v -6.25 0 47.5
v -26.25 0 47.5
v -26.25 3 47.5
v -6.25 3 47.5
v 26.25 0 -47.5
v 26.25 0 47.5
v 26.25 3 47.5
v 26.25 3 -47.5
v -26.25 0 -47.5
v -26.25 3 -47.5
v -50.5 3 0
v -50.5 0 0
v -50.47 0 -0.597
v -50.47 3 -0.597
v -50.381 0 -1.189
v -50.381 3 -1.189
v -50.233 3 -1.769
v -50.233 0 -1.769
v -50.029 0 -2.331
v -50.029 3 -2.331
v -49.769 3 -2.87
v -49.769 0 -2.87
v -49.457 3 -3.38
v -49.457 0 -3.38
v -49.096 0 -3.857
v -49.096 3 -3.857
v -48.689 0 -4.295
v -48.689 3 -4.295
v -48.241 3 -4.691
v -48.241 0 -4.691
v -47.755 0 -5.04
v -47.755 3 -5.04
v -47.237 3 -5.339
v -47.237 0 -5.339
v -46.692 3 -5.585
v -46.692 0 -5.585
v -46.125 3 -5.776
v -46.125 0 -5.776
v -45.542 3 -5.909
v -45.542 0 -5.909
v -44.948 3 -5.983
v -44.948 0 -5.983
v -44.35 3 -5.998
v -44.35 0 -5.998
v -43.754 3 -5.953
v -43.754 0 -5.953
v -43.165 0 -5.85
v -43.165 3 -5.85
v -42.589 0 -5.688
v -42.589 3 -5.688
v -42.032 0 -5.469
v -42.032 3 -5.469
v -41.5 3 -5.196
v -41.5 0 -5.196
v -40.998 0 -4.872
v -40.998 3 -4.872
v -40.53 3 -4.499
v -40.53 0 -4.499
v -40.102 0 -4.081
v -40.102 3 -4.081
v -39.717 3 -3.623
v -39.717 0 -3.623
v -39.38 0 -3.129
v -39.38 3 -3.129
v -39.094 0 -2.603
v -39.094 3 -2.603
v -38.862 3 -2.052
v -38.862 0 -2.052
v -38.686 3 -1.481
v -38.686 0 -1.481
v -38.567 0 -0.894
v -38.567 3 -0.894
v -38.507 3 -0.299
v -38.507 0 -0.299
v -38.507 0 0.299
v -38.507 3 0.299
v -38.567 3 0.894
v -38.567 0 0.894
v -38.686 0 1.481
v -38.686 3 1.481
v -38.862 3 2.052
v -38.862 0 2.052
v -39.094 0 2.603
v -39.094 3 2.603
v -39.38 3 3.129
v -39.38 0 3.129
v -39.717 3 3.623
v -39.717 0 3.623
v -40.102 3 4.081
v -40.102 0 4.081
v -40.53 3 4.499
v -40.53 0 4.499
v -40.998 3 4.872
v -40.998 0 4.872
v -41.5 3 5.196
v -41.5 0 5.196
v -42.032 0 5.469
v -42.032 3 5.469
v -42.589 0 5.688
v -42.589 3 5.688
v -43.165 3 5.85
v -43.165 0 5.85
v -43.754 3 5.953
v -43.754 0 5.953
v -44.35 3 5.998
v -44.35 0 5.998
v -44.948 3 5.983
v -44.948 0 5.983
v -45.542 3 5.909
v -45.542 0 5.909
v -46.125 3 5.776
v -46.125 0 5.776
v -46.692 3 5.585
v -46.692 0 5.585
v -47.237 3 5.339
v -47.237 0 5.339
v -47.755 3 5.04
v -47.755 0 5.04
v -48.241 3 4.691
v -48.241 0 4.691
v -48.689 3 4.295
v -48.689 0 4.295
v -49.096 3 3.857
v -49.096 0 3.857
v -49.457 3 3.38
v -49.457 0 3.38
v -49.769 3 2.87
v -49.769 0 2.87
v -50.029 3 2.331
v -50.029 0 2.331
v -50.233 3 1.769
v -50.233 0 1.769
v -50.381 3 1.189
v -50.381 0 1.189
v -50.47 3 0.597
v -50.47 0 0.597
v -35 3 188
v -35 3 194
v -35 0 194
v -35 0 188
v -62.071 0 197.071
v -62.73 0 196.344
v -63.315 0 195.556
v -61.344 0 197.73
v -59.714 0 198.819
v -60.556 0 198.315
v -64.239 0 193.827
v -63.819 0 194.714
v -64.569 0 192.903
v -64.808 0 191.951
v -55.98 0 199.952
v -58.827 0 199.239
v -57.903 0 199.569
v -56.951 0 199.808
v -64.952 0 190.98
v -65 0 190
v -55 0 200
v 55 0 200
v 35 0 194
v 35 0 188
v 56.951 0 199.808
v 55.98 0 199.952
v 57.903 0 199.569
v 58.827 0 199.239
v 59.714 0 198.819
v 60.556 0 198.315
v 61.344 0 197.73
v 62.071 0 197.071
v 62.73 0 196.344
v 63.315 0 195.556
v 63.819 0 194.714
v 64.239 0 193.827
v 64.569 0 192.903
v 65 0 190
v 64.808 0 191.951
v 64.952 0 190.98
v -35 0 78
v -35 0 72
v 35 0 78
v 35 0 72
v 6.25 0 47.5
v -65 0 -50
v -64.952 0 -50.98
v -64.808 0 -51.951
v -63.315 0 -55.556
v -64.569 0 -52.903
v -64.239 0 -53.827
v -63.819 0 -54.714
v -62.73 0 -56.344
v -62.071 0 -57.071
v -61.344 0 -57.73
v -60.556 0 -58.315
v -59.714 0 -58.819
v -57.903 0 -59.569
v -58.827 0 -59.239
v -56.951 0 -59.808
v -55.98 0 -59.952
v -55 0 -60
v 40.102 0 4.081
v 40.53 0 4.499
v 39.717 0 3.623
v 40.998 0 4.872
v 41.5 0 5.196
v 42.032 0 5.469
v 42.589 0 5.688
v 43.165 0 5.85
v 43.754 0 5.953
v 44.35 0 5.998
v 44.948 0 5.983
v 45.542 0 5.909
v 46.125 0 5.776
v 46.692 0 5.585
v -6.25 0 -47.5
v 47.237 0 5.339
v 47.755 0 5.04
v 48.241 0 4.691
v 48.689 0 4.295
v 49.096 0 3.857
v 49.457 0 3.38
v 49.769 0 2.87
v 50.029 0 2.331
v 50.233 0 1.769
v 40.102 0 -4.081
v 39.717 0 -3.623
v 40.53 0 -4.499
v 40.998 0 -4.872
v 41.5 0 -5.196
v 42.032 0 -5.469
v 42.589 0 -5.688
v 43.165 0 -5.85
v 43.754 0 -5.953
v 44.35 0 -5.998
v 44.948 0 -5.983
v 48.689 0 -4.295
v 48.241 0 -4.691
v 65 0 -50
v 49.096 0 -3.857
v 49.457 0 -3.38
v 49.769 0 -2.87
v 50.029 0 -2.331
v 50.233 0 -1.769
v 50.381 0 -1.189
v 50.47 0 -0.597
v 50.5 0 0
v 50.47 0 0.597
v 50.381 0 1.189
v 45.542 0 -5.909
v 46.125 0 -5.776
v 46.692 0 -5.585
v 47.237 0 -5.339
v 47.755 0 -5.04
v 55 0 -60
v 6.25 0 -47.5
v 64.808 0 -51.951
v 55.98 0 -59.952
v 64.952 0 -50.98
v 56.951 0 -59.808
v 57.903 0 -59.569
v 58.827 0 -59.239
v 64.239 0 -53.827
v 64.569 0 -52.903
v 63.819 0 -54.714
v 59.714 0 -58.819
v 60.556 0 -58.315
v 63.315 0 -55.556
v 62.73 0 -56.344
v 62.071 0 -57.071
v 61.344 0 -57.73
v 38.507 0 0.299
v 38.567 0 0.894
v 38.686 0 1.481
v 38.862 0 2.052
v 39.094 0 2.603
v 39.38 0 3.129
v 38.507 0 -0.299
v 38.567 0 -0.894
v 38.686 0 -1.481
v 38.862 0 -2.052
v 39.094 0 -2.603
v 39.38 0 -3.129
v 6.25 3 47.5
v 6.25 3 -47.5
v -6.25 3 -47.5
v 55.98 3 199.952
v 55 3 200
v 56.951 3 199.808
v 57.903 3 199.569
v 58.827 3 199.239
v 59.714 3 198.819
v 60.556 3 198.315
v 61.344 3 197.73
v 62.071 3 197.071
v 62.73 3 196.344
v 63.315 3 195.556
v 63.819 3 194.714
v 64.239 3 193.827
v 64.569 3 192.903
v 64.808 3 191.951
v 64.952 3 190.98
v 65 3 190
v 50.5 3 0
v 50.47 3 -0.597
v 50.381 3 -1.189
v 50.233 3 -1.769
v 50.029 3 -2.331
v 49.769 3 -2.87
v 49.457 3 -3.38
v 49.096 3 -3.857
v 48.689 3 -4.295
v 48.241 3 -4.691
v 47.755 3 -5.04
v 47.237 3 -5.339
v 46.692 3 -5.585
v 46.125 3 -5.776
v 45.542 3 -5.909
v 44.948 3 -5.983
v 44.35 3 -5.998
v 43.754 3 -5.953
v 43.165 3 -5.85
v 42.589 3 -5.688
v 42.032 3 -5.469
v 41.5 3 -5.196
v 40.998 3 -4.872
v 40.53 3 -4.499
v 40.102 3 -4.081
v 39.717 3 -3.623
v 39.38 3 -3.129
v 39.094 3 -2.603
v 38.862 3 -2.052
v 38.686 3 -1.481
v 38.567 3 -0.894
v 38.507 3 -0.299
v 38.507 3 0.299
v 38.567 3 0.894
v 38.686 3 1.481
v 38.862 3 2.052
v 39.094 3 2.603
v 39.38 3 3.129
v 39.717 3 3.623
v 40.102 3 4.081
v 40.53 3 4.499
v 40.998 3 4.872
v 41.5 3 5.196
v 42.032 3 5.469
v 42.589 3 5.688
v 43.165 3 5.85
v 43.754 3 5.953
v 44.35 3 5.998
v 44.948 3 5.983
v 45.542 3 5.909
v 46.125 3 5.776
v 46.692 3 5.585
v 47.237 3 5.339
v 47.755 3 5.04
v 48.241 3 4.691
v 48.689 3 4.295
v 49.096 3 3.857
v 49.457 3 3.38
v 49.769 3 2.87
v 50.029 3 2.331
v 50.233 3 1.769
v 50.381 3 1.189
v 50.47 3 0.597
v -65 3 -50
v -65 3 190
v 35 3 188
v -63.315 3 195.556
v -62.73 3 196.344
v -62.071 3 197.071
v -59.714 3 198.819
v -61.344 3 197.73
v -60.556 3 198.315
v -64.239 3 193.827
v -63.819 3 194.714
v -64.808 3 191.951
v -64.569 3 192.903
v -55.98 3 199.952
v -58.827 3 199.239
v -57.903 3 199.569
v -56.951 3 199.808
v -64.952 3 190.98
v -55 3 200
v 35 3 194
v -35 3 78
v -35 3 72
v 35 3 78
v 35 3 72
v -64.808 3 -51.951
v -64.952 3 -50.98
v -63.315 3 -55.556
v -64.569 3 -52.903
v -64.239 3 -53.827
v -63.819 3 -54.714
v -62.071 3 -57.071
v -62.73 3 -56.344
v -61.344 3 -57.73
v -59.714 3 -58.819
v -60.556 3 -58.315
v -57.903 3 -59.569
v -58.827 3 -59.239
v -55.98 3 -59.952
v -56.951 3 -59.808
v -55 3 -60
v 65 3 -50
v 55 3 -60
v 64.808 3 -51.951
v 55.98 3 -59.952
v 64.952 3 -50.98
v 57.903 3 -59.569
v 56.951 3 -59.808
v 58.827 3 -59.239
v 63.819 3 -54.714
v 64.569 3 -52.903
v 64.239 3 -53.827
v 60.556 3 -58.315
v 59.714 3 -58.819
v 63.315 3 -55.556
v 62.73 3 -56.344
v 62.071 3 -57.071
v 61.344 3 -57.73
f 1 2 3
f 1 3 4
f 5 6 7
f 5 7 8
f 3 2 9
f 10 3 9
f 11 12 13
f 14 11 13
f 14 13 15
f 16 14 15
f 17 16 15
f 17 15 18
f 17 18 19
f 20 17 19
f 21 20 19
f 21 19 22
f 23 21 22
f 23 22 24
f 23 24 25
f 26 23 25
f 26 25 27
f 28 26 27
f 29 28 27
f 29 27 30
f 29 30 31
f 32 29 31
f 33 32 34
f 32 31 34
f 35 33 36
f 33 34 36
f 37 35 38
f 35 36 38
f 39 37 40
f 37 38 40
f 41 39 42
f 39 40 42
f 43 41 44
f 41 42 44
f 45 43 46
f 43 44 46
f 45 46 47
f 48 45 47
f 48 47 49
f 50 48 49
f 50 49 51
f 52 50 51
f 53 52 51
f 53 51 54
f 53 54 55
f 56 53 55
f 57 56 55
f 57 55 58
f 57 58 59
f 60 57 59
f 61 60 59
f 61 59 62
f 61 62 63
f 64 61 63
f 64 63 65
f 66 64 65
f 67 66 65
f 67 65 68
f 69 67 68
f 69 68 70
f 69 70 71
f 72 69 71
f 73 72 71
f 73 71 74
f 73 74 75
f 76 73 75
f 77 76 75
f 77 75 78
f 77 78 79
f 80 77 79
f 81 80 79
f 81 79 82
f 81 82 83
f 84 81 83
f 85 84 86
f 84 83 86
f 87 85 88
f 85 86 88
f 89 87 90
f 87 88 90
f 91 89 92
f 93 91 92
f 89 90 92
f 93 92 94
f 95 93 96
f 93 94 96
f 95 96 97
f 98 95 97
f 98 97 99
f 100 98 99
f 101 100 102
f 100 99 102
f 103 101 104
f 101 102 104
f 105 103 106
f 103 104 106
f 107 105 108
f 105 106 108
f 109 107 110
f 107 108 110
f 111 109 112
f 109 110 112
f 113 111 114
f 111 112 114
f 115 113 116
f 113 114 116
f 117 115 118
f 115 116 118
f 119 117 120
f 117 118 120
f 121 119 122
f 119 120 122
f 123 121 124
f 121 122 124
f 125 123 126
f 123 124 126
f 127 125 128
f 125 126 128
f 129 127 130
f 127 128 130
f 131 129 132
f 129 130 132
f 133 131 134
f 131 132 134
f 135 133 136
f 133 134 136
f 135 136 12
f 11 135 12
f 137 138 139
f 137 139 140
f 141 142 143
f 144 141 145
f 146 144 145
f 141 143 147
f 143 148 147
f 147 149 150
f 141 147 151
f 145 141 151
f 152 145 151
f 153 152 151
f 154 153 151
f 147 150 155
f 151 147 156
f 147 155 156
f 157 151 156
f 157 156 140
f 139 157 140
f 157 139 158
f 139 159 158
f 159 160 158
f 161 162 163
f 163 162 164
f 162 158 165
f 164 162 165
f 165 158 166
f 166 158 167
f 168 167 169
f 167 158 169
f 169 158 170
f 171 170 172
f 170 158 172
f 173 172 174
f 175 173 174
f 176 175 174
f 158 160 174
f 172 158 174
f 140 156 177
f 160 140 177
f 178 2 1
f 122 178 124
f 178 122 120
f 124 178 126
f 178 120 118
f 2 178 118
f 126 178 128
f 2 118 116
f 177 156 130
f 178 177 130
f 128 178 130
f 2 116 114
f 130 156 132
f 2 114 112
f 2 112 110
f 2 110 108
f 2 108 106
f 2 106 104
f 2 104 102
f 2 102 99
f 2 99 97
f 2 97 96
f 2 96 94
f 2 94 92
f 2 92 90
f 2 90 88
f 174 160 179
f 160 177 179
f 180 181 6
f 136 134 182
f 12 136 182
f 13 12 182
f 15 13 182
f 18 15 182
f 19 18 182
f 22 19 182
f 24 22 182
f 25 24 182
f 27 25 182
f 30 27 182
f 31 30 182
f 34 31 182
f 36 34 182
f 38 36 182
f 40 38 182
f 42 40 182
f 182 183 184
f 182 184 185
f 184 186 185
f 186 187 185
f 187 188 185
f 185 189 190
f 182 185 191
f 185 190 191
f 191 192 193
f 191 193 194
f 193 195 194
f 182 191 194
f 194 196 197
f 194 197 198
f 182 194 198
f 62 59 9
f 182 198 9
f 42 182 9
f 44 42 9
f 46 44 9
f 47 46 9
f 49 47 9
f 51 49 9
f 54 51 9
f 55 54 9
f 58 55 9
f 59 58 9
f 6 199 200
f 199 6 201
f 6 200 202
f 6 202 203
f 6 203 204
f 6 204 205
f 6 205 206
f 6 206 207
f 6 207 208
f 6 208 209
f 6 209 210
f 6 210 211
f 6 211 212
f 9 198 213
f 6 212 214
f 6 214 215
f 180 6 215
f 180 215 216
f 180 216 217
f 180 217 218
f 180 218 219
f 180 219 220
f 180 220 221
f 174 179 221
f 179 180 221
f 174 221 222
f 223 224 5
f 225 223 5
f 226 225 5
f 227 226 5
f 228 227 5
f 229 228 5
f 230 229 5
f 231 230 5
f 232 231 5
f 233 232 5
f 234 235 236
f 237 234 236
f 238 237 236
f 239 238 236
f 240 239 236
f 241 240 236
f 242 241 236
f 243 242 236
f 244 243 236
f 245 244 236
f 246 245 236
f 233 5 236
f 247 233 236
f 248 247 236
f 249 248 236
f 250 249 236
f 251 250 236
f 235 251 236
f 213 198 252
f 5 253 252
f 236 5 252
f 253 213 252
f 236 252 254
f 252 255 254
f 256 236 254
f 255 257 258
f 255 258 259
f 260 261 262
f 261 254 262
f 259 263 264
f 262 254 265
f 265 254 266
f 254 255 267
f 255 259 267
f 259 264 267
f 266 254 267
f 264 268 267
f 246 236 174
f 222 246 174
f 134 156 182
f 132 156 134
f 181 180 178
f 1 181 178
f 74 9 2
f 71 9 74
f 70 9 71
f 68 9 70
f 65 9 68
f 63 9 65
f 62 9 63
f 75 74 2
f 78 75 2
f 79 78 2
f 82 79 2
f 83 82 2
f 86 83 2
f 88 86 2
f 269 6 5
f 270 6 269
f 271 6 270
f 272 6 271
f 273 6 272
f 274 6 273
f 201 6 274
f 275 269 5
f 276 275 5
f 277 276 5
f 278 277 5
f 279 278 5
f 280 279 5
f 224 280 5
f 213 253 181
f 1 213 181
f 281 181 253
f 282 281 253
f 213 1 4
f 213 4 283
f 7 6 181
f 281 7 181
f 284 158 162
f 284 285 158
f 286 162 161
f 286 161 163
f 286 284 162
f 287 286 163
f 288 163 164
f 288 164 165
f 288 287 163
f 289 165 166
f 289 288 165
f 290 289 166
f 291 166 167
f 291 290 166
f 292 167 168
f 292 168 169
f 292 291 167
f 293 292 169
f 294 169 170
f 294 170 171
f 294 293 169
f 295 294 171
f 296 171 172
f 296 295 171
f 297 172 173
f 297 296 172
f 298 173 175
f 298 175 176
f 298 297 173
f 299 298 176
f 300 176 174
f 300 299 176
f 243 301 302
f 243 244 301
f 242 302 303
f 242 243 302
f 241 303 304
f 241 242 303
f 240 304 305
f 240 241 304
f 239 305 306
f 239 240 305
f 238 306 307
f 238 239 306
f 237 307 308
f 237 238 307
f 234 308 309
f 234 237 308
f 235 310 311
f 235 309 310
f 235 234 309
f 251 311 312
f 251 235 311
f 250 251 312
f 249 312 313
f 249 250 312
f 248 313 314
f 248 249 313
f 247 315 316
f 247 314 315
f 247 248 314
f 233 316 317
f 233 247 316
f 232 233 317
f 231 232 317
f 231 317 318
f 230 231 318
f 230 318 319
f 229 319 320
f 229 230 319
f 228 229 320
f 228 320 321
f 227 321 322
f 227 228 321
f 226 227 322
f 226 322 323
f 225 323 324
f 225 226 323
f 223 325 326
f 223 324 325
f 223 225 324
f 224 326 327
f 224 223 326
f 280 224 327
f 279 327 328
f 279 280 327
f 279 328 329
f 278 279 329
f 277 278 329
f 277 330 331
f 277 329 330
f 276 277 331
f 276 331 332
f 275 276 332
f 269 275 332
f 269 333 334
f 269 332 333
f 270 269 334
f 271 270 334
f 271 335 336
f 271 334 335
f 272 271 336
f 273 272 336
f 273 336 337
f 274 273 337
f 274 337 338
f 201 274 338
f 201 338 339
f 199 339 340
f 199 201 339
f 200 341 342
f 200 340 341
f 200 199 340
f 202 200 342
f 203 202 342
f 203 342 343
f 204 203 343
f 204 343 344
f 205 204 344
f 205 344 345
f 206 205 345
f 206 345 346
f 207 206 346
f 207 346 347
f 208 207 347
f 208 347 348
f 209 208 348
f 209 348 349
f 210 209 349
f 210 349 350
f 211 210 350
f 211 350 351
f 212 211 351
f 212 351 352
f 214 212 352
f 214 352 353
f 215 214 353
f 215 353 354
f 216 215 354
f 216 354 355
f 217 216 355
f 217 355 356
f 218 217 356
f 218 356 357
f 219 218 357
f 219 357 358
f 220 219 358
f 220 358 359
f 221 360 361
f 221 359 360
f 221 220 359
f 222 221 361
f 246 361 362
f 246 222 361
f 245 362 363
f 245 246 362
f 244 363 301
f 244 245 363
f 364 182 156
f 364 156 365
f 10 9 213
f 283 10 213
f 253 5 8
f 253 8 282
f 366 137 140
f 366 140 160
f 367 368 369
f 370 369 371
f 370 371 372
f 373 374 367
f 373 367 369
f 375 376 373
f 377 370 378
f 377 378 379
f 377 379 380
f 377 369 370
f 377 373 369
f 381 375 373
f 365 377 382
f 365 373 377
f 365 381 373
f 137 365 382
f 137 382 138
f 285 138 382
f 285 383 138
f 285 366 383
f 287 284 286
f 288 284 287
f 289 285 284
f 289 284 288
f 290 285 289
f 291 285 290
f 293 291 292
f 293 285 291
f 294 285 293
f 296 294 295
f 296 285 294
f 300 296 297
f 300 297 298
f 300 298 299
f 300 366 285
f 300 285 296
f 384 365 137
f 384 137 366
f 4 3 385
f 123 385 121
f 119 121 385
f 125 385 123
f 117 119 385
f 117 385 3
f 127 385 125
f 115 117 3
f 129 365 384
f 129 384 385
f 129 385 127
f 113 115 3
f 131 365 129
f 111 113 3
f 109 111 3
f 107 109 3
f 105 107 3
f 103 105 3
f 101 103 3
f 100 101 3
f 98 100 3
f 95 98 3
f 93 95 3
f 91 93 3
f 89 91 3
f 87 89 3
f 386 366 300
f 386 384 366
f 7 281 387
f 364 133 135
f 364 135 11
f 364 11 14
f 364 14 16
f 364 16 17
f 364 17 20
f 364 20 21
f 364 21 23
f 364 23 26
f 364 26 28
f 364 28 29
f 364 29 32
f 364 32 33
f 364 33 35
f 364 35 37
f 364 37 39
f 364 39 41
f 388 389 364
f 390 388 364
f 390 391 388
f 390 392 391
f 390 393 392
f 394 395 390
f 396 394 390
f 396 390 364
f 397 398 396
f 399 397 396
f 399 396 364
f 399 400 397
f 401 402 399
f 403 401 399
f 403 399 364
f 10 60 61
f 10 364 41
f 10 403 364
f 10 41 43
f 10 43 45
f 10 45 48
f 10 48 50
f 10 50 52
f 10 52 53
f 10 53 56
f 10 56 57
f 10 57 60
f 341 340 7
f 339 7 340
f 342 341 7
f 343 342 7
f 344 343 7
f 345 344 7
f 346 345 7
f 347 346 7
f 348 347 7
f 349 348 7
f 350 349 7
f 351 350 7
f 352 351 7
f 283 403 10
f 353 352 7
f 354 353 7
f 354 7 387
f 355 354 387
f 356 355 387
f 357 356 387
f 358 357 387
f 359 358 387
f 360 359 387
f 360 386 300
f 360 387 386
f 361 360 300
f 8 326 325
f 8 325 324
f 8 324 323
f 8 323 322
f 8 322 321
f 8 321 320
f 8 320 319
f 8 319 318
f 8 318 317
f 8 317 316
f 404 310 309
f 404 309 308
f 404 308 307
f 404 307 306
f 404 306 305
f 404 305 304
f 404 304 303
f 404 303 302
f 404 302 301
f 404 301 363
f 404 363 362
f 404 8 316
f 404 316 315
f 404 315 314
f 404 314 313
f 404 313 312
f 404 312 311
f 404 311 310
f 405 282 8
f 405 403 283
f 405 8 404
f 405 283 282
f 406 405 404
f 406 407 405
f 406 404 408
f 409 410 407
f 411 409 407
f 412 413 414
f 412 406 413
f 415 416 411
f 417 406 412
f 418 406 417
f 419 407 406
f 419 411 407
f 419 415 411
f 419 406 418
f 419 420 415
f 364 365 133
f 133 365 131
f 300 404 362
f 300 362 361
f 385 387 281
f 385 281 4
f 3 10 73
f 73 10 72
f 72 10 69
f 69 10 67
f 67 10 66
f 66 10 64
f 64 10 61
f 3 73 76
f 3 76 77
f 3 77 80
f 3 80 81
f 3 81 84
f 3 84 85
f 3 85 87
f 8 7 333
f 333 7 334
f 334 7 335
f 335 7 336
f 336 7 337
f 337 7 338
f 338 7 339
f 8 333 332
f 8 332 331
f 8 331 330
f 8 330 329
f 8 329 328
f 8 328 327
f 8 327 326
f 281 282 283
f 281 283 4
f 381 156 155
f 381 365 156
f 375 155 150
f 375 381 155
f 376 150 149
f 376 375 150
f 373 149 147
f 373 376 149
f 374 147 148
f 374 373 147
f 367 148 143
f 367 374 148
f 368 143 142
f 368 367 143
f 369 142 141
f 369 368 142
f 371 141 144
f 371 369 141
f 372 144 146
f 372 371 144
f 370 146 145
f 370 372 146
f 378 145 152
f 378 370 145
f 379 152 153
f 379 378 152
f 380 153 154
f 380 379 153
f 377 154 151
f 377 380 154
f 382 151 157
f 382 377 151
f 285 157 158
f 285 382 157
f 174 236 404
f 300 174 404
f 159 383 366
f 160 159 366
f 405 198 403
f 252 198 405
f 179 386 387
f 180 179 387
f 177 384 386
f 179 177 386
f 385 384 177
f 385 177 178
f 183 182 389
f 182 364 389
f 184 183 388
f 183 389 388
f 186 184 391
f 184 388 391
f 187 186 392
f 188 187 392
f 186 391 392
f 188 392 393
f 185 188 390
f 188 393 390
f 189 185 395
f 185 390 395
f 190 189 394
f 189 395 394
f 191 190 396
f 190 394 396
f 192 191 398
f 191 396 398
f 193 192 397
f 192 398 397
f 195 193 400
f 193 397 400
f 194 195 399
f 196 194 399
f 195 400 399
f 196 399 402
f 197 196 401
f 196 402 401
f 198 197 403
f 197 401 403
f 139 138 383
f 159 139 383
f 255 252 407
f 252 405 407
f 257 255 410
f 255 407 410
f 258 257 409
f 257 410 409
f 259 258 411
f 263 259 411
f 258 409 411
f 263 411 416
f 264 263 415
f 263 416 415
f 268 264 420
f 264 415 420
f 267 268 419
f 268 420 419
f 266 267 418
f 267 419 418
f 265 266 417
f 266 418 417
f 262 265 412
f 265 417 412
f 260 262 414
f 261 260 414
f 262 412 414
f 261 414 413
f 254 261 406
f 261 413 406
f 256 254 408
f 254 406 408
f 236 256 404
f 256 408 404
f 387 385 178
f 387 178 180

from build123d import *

# Parameters (mm, degrees)
SKETCH1_W               = 130
SKETCH1_H               = 120
BOSS_EXTRUDE1_DEPTH     = 3
CUT_EXTRUDE1_START      = -4
SKETCH2_W               = 20
SKETCH2_H               = 95
CUT_EXTRUDE1_DEPTH      = 5
CUT_EXTRUDE2_START      = -4
SKETCH3_R               = 6
CUT_EXTRUDE2_DEPTH      = 5
SKETCH4_W               = 130
SKETCH4_H               = 3
BOSS_EXTRUDE2_DEPTH     = 140
SKETCH5_W               = 70
SKETCH5_H               = 6
CUT_EXTRUDE3_DEPTH      = 1
CUT_EXTRUDE3_DEPTH_BACK = 4
FILLET1_R               = 10


with BuildPart() as part:
    # Sketch1 → Boss-Extrude1 (new body)
    with BuildSketch(Plane(origin=(0, 0, 0), x_dir=(1, 0, 0), z_dir=(0, 1, 0))):
        Rectangle(SKETCH1_W, SKETCH1_H)
    extrude(amount=BOSS_EXTRUDE1_DEPTH)

    # Sketch2 → Cut-Extrude1 (cut)
    with BuildSketch(Plane(origin=(0, 3, 0), x_dir=(1, 0, 0), z_dir=(0, 1, 0)).offset(CUT_EXTRUDE1_START)):
        with Locations((-16.25, 0)):
            Rectangle(SKETCH2_W, SKETCH2_H)
    cut_extrude1 = extrude(amount=CUT_EXTRUDE1_DEPTH, mode=Mode.SUBTRACT)

    # Mirror1: Cut-Extrude1 across plane
    add(cut_extrude1.mirror(Plane(origin=(0, 0, 0), x_dir=(0, 0, 1), z_dir=(1, 0, 0))), mode=Mode.SUBTRACT)

    # Sketch3 → Cut-Extrude2 (cut)
    with BuildSketch(Plane(origin=(0, 3, 0), x_dir=(1, 0, 0), z_dir=(0, 1, 0)).offset(CUT_EXTRUDE2_START)):
        with Locations((44.5, 0)):
            Circle(SKETCH3_R)
    cut_extrude2 = extrude(amount=CUT_EXTRUDE2_DEPTH, mode=Mode.SUBTRACT)

    # Mirror2: Cut-Extrude2 across plane
    add(cut_extrude2.mirror(Plane(origin=(0, 0, 0), x_dir=(0, 0, 1), z_dir=(1, 0, 0))), mode=Mode.SUBTRACT)

    # Sketch4 → Boss-Extrude2 (add)
    with BuildSketch(Plane.XY.offset(60)):
        with Locations((0, 1.5)):
            Rectangle(SKETCH4_W, SKETCH4_H)
    extrude(amount=BOSS_EXTRUDE2_DEPTH)

    # Sketch5 → Cut-Extrude3 (cut, two sides)
    with BuildSketch(Plane(origin=(0, 3, 0), x_dir=(1, 0, 0), z_dir=(0, 1, 0))) as cut_extrude3_sk:
        with Locations((0, -75)):
            Rectangle(SKETCH5_W, SKETCH5_H)
        with Locations((0, -191)):
            Rectangle(SKETCH5_W, SKETCH5_H)
    extrude(amount=CUT_EXTRUDE3_DEPTH, mode=Mode.SUBTRACT)
    extrude(cut_extrude3_sk.sketch, amount=-CUT_EXTRUDE3_DEPTH_BACK, mode=Mode.SUBTRACT)

    # Fillet1
    fillet1_edges = [part.edges().sort_by_distance(p)[0] for p in [
        (-65, 1.5, 200),
        (65, 1.5, 200),
        (-65, 1.5, -60),
        (65, 1.5, -60),
    ]]
    fillet(fillet1_edges, radius=FILLET1_R)


solid = part.part
